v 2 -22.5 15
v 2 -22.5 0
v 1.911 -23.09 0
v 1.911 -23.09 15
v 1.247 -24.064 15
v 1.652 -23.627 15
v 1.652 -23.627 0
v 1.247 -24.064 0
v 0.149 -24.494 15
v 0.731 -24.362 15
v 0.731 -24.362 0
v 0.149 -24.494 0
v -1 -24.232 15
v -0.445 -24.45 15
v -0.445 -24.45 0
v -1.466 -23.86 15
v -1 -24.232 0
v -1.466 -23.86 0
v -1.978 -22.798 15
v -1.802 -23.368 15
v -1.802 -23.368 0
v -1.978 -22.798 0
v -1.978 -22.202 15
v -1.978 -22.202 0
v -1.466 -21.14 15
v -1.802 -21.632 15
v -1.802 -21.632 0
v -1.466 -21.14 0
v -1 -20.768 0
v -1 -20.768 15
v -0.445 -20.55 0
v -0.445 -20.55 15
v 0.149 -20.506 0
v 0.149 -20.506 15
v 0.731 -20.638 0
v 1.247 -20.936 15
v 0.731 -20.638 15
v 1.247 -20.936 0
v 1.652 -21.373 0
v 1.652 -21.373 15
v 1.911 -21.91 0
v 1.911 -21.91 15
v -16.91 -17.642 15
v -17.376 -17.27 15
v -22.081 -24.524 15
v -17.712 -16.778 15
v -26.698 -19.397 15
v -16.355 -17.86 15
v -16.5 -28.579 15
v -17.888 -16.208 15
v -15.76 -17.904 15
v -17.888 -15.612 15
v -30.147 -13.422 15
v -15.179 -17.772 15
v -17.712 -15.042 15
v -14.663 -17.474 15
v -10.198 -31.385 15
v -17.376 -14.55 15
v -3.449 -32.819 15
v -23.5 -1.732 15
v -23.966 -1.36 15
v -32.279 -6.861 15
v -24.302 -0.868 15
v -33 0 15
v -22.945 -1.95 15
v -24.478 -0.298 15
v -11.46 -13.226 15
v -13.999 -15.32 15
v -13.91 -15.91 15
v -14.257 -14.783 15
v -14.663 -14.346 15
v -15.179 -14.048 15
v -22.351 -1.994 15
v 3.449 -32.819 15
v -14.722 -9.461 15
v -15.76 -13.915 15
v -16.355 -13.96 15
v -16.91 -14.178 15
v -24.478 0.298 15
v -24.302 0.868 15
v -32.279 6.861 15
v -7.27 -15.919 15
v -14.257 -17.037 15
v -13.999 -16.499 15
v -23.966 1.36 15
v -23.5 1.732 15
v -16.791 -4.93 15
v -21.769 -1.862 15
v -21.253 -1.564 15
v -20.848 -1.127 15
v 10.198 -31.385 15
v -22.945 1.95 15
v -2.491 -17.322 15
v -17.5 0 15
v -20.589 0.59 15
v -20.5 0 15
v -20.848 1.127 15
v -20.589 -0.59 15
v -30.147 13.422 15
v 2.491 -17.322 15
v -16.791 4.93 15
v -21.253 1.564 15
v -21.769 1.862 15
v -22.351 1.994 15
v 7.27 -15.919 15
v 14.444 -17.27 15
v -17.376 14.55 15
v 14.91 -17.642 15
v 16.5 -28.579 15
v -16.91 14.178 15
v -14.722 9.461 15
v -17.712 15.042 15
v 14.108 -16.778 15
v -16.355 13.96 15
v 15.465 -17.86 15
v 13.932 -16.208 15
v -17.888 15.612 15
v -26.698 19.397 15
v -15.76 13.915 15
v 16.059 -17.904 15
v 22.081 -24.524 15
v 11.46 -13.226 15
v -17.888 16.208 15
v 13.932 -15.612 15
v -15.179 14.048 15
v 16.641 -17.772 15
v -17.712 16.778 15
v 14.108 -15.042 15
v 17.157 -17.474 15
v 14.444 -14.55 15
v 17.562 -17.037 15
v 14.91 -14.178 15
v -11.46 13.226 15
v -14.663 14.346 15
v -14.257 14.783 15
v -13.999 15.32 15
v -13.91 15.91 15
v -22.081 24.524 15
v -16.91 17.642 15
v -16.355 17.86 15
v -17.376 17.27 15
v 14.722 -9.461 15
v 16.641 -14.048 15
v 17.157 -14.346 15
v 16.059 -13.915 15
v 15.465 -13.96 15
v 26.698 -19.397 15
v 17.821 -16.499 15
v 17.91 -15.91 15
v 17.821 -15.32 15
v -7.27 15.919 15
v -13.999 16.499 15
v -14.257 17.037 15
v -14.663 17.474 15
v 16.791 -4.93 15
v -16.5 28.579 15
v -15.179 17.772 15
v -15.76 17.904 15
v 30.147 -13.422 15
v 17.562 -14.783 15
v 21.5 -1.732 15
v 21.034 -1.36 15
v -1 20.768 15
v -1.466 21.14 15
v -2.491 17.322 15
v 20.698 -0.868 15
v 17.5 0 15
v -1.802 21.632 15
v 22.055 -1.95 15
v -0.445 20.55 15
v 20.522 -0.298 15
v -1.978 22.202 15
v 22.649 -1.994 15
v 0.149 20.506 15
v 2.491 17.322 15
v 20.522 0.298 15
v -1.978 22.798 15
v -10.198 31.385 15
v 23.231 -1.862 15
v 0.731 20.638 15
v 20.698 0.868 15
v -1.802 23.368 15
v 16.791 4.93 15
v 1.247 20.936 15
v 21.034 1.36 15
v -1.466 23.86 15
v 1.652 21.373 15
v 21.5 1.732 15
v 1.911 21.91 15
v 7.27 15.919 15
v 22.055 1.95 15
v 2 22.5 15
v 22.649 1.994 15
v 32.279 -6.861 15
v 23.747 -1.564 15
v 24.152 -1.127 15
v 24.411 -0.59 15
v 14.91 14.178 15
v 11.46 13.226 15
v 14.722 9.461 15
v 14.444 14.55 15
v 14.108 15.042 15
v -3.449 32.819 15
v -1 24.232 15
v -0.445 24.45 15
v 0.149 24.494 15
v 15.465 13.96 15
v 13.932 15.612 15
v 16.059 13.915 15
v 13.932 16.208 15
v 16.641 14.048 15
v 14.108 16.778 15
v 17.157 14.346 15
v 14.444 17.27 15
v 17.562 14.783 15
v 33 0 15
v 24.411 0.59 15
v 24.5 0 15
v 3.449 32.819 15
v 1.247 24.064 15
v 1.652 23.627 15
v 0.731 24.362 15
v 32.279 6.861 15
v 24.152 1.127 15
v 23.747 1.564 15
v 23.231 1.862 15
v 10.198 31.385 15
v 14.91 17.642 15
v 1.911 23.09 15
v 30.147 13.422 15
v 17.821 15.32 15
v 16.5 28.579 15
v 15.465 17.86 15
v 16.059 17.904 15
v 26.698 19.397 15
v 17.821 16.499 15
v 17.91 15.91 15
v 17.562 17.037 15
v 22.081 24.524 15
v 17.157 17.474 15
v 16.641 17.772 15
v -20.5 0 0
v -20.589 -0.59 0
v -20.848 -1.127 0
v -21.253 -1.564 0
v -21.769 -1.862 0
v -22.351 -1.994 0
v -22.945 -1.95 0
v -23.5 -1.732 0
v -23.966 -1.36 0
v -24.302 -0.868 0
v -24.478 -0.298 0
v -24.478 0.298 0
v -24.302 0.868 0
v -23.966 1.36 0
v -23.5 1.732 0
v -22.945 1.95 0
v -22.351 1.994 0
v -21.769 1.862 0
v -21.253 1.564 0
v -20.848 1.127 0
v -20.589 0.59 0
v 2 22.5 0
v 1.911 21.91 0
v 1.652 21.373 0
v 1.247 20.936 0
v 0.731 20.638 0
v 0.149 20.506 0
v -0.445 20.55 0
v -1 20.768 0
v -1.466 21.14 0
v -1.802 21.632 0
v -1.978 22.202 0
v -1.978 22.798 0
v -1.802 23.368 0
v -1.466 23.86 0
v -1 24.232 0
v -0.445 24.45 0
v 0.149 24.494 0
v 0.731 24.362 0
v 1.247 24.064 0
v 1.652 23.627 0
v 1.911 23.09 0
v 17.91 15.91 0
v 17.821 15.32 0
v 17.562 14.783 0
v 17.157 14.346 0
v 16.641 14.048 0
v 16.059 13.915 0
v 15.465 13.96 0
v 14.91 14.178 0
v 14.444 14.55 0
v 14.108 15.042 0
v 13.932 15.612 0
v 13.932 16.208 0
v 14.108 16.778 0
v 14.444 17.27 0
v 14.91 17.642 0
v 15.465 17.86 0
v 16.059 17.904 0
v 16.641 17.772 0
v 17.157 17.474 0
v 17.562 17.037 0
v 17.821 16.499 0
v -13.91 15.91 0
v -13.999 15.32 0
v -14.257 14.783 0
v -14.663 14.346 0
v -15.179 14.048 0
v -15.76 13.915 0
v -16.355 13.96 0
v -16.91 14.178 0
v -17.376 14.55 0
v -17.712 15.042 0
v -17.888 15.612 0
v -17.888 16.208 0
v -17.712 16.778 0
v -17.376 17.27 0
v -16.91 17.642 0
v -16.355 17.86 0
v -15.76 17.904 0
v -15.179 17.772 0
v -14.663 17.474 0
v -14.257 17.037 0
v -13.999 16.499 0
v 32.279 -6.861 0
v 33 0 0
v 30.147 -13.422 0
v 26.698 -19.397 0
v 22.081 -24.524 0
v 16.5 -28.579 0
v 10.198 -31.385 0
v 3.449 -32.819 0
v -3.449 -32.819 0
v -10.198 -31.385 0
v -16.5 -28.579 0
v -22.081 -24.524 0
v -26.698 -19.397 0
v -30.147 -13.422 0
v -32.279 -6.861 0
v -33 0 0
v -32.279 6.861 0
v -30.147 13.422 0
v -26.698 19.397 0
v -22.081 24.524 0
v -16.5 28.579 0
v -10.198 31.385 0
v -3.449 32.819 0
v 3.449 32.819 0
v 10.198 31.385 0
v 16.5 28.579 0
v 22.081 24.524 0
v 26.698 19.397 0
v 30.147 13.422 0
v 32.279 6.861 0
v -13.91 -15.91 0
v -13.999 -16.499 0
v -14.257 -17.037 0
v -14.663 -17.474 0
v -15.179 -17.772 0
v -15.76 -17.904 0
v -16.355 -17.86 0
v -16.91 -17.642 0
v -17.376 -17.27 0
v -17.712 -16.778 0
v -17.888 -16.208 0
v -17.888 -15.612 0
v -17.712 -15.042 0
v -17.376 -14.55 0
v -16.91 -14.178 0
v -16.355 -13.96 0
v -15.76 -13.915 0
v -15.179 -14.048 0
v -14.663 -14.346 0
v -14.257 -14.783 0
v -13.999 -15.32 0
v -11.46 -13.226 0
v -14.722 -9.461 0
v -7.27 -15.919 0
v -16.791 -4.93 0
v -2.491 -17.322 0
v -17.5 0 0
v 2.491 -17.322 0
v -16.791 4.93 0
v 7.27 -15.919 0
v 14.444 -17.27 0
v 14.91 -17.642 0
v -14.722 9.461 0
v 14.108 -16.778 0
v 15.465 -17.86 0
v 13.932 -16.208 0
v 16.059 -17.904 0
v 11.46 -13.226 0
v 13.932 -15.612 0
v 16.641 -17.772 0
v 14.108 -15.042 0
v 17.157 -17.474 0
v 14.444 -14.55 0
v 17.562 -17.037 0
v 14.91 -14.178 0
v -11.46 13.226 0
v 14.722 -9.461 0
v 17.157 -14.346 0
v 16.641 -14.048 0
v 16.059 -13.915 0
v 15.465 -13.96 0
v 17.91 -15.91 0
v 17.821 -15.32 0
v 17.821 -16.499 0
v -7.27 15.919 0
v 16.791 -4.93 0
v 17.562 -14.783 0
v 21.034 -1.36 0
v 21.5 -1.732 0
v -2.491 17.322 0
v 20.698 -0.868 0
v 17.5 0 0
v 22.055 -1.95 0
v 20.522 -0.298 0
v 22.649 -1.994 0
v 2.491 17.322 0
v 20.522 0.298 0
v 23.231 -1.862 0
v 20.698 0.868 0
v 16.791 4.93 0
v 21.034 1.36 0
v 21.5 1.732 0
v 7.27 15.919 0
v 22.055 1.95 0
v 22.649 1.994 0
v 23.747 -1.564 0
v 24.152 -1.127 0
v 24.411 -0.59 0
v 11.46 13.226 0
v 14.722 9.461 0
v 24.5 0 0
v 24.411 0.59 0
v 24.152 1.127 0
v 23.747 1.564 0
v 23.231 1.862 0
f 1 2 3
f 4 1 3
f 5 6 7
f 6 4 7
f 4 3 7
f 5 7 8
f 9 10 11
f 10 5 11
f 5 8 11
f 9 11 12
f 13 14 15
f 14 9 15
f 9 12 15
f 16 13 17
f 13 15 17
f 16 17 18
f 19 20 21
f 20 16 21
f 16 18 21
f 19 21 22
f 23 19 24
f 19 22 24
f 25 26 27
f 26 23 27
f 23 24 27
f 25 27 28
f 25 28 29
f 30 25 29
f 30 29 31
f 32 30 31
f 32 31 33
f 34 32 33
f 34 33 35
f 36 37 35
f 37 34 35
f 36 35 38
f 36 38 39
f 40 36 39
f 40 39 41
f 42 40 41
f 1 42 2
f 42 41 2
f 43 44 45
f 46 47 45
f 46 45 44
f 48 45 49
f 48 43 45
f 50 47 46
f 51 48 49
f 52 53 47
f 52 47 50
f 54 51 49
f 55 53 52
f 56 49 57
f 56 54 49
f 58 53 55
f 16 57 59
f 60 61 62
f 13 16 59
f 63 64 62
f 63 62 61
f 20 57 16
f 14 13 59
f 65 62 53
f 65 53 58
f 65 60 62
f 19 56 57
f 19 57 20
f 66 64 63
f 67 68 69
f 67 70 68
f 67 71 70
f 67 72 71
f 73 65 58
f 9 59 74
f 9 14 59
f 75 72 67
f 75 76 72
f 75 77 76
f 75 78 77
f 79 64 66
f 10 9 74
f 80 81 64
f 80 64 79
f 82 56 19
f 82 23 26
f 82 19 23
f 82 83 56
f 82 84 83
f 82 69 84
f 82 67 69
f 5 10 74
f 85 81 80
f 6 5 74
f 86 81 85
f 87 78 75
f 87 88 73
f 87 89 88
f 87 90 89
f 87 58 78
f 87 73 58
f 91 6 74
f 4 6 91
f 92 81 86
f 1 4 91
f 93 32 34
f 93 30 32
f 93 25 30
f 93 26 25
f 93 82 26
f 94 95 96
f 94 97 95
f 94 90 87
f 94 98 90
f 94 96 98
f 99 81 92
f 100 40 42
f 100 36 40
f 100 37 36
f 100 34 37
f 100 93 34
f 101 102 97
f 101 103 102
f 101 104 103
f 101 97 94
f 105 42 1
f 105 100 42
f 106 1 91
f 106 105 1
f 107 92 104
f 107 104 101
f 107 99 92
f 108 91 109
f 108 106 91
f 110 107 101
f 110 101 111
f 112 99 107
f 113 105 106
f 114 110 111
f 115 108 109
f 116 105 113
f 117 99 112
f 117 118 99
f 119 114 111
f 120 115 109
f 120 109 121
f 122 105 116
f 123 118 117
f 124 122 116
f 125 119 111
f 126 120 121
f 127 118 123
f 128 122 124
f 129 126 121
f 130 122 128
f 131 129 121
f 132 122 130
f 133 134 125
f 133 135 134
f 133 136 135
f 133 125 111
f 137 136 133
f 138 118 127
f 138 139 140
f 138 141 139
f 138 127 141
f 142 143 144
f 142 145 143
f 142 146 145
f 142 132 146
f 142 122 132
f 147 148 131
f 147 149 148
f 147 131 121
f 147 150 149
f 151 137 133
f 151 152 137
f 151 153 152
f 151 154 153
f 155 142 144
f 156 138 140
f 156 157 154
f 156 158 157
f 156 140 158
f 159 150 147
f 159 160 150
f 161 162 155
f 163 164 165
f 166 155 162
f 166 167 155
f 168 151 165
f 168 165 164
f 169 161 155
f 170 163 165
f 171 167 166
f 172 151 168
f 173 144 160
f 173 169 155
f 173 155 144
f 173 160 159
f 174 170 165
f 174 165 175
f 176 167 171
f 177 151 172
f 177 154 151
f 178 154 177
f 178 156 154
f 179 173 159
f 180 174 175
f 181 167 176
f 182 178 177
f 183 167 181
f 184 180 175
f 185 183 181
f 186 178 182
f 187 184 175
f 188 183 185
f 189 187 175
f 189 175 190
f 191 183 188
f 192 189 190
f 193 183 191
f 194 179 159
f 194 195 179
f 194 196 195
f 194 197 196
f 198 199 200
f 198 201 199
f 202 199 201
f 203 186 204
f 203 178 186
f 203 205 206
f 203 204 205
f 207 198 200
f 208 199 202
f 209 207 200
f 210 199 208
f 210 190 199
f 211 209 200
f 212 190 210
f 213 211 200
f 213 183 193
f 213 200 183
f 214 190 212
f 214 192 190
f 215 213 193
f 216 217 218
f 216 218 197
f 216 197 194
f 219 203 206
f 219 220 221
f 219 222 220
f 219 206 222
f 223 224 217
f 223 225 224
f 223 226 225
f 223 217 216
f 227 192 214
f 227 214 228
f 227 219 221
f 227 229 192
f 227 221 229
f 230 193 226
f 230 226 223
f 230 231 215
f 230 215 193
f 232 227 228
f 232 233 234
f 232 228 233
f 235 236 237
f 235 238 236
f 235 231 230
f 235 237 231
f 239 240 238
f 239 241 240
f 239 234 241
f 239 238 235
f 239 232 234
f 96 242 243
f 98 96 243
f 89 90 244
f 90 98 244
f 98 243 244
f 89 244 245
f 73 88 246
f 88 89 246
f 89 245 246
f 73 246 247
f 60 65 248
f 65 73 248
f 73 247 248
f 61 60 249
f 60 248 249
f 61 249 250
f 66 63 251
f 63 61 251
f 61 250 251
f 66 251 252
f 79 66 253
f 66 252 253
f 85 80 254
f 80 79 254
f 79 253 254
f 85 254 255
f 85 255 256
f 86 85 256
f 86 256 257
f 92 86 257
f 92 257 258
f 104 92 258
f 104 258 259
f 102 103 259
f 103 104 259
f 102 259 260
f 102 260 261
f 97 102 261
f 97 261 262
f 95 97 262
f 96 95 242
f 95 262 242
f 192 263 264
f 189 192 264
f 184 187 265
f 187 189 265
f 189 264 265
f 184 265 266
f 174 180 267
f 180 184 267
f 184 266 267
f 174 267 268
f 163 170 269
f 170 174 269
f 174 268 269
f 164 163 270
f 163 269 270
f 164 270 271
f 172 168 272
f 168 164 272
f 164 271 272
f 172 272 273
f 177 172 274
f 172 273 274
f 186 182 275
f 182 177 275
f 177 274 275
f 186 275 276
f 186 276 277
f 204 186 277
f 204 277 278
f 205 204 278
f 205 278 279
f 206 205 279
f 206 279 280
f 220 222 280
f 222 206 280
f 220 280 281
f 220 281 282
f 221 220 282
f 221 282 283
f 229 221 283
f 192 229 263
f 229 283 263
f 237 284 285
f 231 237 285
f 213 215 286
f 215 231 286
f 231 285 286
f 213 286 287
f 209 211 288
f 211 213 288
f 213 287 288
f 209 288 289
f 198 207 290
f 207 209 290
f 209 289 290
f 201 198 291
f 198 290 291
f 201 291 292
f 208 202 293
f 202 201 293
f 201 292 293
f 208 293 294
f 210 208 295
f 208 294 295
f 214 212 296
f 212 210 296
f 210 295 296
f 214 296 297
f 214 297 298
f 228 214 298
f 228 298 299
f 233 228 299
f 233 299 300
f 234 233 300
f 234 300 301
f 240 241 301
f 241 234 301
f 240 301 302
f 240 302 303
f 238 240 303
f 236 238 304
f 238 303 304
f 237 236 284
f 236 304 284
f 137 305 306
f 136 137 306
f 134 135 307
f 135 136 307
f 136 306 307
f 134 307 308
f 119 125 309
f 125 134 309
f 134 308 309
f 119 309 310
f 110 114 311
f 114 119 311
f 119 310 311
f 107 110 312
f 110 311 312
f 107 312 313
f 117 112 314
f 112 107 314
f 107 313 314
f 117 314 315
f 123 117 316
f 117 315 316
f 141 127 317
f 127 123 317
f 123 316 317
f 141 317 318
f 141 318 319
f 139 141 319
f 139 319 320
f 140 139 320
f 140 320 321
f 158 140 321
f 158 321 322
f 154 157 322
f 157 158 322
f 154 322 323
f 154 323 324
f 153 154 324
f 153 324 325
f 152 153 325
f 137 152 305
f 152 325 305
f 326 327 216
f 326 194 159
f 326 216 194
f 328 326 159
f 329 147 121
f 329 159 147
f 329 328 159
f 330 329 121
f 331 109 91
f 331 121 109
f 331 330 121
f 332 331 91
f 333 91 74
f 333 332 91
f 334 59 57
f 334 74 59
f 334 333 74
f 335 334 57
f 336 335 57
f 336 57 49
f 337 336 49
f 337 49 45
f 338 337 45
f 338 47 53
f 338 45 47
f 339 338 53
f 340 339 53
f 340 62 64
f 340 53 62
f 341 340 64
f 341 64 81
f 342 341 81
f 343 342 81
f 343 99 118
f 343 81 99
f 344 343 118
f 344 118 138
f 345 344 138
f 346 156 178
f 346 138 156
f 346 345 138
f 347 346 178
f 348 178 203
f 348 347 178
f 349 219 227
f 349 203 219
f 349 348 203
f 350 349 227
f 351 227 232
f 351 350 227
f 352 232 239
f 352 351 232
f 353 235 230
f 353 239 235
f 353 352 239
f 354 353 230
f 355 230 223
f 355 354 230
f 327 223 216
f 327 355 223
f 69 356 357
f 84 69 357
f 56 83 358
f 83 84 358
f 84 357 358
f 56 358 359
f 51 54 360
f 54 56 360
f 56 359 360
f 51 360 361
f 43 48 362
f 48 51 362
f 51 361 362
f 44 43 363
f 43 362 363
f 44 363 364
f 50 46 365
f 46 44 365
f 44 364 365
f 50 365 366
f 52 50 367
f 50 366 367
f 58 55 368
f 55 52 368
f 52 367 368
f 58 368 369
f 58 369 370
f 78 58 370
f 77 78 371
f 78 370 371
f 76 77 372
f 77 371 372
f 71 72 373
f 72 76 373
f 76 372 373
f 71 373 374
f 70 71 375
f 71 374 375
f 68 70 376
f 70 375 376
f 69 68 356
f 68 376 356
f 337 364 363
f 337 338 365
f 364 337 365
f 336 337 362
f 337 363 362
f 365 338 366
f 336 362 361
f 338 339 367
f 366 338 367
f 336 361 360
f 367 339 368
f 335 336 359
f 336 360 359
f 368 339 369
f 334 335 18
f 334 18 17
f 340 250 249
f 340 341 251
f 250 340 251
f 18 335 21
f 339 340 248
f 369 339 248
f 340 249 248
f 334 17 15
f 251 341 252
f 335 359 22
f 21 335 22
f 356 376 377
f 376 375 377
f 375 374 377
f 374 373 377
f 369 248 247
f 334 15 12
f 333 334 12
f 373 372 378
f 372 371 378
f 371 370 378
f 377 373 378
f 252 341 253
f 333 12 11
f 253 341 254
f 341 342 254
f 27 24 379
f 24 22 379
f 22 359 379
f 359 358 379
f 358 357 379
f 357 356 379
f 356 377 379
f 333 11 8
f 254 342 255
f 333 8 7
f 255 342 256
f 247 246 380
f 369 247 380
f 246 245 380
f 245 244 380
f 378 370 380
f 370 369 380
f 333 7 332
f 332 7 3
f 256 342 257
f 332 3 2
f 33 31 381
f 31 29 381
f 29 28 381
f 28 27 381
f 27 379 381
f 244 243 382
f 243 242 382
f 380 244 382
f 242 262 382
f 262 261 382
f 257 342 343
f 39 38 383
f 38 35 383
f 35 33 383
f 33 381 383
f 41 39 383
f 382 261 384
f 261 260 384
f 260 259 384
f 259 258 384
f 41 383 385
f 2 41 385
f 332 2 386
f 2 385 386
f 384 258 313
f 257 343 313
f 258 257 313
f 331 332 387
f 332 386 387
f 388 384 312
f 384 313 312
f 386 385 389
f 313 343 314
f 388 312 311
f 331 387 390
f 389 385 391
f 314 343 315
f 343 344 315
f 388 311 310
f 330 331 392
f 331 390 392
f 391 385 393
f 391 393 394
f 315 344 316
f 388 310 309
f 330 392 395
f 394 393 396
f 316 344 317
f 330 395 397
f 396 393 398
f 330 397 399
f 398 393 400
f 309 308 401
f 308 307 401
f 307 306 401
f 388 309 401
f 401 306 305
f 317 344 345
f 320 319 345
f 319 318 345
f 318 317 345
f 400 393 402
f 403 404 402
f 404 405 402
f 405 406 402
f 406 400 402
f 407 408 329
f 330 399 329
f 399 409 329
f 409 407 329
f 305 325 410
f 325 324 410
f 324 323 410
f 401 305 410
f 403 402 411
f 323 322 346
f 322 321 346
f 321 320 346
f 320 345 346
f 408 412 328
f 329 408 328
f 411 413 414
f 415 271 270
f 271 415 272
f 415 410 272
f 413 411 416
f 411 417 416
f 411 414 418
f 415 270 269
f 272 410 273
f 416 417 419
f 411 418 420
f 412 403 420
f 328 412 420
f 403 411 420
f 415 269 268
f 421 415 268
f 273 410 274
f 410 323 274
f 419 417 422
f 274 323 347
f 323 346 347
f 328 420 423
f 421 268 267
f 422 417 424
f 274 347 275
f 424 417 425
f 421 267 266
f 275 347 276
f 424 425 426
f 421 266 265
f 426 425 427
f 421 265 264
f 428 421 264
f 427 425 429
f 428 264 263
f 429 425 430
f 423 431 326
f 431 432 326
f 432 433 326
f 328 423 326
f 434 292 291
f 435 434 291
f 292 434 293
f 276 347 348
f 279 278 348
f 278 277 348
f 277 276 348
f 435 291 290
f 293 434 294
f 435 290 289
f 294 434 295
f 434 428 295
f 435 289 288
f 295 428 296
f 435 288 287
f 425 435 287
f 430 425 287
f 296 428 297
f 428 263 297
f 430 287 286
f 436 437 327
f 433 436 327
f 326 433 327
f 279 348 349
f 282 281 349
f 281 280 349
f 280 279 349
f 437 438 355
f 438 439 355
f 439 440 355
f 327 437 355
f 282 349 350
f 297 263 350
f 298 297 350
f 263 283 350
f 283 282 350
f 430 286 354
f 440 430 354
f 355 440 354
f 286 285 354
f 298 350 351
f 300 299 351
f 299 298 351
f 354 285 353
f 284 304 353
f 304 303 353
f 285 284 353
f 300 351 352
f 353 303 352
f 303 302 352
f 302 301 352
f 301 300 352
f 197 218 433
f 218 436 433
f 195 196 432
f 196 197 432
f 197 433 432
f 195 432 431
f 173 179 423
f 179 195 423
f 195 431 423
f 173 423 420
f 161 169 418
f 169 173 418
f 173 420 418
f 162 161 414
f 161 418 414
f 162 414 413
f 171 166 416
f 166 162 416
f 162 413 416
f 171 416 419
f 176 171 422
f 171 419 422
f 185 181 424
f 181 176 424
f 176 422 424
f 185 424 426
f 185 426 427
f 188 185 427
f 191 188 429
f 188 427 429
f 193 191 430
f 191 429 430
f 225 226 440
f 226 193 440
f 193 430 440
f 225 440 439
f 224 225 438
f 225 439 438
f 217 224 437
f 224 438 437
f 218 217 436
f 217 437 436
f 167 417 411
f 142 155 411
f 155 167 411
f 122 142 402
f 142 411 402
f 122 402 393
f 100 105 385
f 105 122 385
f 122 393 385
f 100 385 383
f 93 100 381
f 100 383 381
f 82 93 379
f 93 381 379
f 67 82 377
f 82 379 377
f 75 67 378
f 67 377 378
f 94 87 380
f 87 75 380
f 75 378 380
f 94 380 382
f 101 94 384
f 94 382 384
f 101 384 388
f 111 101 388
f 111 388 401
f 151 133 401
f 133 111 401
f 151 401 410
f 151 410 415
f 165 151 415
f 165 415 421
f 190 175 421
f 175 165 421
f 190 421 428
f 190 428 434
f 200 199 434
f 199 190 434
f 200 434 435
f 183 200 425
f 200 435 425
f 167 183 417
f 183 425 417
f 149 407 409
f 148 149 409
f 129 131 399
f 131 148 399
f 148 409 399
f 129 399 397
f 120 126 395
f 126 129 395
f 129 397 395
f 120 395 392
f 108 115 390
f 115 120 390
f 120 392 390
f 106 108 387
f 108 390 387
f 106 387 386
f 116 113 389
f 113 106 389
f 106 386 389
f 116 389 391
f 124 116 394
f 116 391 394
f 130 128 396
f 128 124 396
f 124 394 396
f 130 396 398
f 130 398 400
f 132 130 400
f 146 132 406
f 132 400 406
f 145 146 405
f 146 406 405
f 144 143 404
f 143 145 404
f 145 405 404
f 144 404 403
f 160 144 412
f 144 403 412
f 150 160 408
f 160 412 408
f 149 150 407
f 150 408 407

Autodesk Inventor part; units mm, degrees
ref_plane "YZ Plane" through (0, 0, 0) normal (1, 0, 0) x (0, 1, 0)
ref_plane "XZ Plane" through (0, 0, 0) normal (0, 1, 0) x (-1, 0, 0)
ref_plane "XY Plane" through (0, 0, 0) normal (0, 0, 1) x (1, 0, 0)
sketch "Sketch1" plane through (0, 0, 0) normal (0, 0, 1) x (1, 0, 0)
  circle A0 centre (0, 0) radius 33
  circle A1 centre (0, 0) radius 17.5
  circle A2 centre (-22.5, 0) radius 2
  circle A3 centre (-15.9099, -15.9099) radius 2
  circle A4 centre (0, -22.5) radius 2
  circle A5 centre (15.9099, -15.9099) radius 2
  circle A6 centre (22.5, 0) radius 2
  circle A7 centre (15.9099, 15.9099) radius 2
  circle A8 centre (0, 22.5) radius 2
  circle A9 centre (-15.9099, 15.9099) radius 2
  dimension "d0" = 66
  dimension "d1" = 35
  dimension "d2" = 4
  dimension "d3" = 22.5
  dimension "d6" = 360
extrude "Extrusion1" add sketch "Sketch1" along normal blind 15
properties part number "Slewing B" material "Aluminum 6061"
